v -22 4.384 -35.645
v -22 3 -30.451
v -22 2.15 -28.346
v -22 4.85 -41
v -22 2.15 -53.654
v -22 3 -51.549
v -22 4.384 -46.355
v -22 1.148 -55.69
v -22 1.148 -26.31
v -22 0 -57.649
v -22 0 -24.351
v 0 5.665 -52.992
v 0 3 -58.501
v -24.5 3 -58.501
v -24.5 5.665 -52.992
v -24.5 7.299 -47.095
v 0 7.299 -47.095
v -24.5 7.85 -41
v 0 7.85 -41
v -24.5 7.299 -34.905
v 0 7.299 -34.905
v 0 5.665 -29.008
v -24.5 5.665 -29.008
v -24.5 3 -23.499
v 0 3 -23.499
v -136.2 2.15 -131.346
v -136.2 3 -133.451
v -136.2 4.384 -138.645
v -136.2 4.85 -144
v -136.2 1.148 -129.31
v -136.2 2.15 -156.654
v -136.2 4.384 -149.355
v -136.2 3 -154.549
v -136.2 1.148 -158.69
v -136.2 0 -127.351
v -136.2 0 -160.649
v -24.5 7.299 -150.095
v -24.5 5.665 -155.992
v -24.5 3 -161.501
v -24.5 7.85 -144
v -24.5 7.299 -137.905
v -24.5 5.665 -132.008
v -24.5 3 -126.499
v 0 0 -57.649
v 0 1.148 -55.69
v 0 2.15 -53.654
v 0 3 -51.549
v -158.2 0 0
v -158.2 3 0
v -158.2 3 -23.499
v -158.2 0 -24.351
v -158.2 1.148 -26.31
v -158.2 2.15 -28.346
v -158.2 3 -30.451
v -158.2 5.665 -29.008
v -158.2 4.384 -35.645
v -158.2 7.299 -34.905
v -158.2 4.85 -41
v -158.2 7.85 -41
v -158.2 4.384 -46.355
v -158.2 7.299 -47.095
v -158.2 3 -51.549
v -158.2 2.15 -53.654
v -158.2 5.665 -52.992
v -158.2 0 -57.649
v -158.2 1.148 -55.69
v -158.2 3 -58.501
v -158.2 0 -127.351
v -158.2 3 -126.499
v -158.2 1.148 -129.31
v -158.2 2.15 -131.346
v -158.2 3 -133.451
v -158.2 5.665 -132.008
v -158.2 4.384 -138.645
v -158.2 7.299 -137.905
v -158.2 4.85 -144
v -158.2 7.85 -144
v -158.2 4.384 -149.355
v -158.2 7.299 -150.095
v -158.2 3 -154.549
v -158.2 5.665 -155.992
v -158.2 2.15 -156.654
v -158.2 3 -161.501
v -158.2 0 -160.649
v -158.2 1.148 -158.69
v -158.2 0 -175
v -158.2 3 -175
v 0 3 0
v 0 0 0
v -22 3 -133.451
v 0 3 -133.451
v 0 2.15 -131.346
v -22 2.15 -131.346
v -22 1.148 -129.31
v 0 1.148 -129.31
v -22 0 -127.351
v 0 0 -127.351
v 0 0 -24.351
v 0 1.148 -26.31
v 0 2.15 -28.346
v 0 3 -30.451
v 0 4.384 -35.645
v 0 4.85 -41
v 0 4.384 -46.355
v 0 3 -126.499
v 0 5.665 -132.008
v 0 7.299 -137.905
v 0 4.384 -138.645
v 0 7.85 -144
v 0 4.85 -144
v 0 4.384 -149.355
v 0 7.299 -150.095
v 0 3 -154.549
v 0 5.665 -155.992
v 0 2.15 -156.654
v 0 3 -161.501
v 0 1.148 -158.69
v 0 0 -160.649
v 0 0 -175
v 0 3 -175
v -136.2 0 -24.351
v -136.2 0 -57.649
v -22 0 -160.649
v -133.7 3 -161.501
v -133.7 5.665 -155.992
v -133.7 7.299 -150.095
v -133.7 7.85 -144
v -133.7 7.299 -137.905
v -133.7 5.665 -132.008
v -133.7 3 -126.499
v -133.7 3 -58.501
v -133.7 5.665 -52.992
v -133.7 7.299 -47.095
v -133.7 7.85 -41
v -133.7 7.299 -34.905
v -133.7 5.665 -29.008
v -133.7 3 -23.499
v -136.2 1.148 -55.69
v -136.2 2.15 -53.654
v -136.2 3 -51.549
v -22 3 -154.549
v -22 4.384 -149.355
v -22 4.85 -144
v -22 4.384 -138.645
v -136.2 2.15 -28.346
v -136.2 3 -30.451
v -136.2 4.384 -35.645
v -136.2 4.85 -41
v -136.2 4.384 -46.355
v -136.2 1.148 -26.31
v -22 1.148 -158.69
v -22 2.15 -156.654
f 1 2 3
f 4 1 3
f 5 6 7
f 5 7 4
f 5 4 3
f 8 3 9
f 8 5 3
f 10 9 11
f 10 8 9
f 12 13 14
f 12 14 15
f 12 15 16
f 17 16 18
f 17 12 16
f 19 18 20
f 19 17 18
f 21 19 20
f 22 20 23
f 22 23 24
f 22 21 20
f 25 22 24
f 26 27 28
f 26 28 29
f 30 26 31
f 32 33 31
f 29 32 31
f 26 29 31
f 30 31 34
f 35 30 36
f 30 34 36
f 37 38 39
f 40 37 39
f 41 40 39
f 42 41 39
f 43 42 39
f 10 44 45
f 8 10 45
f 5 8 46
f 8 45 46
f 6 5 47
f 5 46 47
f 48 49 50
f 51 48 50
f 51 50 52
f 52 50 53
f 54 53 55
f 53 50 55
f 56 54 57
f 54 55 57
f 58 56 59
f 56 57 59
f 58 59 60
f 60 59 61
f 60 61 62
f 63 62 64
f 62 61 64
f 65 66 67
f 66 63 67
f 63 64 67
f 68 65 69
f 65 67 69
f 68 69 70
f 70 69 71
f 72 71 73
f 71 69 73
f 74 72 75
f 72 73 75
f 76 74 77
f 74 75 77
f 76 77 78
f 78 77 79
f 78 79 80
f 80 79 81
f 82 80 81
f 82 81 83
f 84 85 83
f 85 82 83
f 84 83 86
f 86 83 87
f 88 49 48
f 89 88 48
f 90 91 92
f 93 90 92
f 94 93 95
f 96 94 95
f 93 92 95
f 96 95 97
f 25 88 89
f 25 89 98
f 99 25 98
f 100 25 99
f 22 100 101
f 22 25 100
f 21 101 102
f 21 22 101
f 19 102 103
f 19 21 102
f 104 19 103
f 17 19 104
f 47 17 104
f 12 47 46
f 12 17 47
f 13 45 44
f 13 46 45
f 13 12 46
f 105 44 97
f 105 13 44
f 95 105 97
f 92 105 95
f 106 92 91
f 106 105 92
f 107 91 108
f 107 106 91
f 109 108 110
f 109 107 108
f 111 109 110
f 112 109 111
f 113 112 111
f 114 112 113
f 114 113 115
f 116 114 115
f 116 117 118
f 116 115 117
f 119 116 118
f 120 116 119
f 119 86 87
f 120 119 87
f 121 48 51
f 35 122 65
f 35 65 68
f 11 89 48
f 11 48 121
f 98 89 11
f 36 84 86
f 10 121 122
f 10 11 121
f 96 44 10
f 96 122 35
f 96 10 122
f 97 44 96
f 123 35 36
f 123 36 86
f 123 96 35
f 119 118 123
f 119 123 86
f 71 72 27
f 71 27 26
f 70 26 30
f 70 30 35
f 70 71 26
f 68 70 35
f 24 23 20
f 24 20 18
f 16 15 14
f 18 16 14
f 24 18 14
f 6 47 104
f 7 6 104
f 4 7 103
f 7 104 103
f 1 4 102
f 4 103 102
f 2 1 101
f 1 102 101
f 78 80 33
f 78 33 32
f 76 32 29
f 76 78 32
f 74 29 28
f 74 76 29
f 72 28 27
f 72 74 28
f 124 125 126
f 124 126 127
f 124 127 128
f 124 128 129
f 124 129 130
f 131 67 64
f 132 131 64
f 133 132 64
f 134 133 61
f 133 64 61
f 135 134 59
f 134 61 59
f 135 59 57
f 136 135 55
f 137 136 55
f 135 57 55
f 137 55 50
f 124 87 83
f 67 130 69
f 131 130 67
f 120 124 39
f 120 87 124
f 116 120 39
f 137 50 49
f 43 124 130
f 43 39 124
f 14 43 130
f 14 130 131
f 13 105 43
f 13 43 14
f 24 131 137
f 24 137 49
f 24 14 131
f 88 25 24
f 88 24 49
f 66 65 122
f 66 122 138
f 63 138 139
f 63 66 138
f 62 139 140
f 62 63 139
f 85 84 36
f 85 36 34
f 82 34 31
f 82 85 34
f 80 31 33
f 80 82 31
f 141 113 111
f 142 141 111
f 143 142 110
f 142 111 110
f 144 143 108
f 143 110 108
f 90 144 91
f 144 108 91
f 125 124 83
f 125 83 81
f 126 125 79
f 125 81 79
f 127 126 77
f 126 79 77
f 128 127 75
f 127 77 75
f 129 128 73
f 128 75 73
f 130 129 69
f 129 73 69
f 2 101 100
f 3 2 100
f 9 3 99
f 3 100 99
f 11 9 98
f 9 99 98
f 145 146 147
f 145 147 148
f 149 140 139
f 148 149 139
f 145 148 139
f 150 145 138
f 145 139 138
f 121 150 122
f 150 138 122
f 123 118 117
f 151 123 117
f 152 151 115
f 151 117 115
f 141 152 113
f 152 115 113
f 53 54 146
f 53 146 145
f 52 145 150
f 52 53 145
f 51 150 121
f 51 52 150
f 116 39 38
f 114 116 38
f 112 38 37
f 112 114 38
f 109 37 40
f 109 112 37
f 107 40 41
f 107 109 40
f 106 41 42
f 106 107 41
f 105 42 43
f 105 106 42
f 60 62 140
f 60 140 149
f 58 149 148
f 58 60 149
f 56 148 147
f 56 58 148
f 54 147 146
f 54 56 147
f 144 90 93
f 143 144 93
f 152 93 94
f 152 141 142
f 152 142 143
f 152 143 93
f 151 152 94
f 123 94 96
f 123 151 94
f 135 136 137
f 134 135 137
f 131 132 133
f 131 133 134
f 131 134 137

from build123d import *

# Parameters (mm, degrees)
SKETCH2_W           = 175
SKETCH2_H           = 3
BOSS_EXTRUDE1_DEPTH = 158.2
BOSS_EXTRUDE2_DEPTH = 24.5
CUT_EXTRUDE1_DEPTH  = 22


with BuildPart() as part:
    # Sketch2 → Boss-Extrude1 (new body)
    with BuildSketch(Plane(origin=(0, 0, 0), x_dir=(0, 0, -1), z_dir=(1, 0, 0))):
        with Locations((87.5, 1.5)):
            Rectangle(SKETCH2_W, SKETCH2_H)
    extrude(amount=-BOSS_EXTRUDE1_DEPTH)

    # Sketch2<5> → Boss-Extrude2 (add)
    with BuildSketch(Plane(origin=(0, 0, 0), x_dir=(0, 0, -1), z_dir=(1, 0, 0))):
        with BuildLine():
            ThreePointArc((58.500785697, 3), (41, 7.85), (23.499214303, 3))
            Line((23.499214303, 3), (58.500785697, 3))
        make_face()
        with BuildLine():
            ThreePointArc((161.500785697, 3), (144, 7.85), (126.499214303, 3))
            Line((126.499214303, 3), (161.500785697, 3))
        make_face()
    boss_extrude2 = extrude(amount=-BOSS_EXTRUDE2_DEPTH)

    # Sketch2<7> → Cut-Extrude1 (cut)
    with BuildSketch(Plane(origin=(0, 0, 0), x_dir=(0, 0, -1), z_dir=(1, 0, 0))):
        with BuildLine():
            Line((24.351351406, 0), (57.648648594, 0))
            ThreePointArc((57.648648594, 0), (41, 4.85), (24.351351406, 0))
        make_face()
        with BuildLine():
            Line((127.351351406, 0), (160.648648594, 0))
            ThreePointArc((160.648648594, 0), (144, 4.85), (127.351351406, 0))
        make_face()
    cut_extrude1 = extrude(amount=-CUT_EXTRUDE1_DEPTH, mode=Mode.SUBTRACT)

    # Mirror1: Boss-Extrude2, Cut-Extrude1 across plane
    add(boss_extrude2.mirror(Plane(origin=(-79.1, 0, 0), x_dir=(0, 0, 1), z_dir=(1, 0, 0))))
    add(cut_extrude1.mirror(Plane(origin=(-79.1, 0, 0), x_dir=(0, 0, 1), z_dir=(1, 0, 0))), mode=Mode.SUBTRACT)


solid = part.part
